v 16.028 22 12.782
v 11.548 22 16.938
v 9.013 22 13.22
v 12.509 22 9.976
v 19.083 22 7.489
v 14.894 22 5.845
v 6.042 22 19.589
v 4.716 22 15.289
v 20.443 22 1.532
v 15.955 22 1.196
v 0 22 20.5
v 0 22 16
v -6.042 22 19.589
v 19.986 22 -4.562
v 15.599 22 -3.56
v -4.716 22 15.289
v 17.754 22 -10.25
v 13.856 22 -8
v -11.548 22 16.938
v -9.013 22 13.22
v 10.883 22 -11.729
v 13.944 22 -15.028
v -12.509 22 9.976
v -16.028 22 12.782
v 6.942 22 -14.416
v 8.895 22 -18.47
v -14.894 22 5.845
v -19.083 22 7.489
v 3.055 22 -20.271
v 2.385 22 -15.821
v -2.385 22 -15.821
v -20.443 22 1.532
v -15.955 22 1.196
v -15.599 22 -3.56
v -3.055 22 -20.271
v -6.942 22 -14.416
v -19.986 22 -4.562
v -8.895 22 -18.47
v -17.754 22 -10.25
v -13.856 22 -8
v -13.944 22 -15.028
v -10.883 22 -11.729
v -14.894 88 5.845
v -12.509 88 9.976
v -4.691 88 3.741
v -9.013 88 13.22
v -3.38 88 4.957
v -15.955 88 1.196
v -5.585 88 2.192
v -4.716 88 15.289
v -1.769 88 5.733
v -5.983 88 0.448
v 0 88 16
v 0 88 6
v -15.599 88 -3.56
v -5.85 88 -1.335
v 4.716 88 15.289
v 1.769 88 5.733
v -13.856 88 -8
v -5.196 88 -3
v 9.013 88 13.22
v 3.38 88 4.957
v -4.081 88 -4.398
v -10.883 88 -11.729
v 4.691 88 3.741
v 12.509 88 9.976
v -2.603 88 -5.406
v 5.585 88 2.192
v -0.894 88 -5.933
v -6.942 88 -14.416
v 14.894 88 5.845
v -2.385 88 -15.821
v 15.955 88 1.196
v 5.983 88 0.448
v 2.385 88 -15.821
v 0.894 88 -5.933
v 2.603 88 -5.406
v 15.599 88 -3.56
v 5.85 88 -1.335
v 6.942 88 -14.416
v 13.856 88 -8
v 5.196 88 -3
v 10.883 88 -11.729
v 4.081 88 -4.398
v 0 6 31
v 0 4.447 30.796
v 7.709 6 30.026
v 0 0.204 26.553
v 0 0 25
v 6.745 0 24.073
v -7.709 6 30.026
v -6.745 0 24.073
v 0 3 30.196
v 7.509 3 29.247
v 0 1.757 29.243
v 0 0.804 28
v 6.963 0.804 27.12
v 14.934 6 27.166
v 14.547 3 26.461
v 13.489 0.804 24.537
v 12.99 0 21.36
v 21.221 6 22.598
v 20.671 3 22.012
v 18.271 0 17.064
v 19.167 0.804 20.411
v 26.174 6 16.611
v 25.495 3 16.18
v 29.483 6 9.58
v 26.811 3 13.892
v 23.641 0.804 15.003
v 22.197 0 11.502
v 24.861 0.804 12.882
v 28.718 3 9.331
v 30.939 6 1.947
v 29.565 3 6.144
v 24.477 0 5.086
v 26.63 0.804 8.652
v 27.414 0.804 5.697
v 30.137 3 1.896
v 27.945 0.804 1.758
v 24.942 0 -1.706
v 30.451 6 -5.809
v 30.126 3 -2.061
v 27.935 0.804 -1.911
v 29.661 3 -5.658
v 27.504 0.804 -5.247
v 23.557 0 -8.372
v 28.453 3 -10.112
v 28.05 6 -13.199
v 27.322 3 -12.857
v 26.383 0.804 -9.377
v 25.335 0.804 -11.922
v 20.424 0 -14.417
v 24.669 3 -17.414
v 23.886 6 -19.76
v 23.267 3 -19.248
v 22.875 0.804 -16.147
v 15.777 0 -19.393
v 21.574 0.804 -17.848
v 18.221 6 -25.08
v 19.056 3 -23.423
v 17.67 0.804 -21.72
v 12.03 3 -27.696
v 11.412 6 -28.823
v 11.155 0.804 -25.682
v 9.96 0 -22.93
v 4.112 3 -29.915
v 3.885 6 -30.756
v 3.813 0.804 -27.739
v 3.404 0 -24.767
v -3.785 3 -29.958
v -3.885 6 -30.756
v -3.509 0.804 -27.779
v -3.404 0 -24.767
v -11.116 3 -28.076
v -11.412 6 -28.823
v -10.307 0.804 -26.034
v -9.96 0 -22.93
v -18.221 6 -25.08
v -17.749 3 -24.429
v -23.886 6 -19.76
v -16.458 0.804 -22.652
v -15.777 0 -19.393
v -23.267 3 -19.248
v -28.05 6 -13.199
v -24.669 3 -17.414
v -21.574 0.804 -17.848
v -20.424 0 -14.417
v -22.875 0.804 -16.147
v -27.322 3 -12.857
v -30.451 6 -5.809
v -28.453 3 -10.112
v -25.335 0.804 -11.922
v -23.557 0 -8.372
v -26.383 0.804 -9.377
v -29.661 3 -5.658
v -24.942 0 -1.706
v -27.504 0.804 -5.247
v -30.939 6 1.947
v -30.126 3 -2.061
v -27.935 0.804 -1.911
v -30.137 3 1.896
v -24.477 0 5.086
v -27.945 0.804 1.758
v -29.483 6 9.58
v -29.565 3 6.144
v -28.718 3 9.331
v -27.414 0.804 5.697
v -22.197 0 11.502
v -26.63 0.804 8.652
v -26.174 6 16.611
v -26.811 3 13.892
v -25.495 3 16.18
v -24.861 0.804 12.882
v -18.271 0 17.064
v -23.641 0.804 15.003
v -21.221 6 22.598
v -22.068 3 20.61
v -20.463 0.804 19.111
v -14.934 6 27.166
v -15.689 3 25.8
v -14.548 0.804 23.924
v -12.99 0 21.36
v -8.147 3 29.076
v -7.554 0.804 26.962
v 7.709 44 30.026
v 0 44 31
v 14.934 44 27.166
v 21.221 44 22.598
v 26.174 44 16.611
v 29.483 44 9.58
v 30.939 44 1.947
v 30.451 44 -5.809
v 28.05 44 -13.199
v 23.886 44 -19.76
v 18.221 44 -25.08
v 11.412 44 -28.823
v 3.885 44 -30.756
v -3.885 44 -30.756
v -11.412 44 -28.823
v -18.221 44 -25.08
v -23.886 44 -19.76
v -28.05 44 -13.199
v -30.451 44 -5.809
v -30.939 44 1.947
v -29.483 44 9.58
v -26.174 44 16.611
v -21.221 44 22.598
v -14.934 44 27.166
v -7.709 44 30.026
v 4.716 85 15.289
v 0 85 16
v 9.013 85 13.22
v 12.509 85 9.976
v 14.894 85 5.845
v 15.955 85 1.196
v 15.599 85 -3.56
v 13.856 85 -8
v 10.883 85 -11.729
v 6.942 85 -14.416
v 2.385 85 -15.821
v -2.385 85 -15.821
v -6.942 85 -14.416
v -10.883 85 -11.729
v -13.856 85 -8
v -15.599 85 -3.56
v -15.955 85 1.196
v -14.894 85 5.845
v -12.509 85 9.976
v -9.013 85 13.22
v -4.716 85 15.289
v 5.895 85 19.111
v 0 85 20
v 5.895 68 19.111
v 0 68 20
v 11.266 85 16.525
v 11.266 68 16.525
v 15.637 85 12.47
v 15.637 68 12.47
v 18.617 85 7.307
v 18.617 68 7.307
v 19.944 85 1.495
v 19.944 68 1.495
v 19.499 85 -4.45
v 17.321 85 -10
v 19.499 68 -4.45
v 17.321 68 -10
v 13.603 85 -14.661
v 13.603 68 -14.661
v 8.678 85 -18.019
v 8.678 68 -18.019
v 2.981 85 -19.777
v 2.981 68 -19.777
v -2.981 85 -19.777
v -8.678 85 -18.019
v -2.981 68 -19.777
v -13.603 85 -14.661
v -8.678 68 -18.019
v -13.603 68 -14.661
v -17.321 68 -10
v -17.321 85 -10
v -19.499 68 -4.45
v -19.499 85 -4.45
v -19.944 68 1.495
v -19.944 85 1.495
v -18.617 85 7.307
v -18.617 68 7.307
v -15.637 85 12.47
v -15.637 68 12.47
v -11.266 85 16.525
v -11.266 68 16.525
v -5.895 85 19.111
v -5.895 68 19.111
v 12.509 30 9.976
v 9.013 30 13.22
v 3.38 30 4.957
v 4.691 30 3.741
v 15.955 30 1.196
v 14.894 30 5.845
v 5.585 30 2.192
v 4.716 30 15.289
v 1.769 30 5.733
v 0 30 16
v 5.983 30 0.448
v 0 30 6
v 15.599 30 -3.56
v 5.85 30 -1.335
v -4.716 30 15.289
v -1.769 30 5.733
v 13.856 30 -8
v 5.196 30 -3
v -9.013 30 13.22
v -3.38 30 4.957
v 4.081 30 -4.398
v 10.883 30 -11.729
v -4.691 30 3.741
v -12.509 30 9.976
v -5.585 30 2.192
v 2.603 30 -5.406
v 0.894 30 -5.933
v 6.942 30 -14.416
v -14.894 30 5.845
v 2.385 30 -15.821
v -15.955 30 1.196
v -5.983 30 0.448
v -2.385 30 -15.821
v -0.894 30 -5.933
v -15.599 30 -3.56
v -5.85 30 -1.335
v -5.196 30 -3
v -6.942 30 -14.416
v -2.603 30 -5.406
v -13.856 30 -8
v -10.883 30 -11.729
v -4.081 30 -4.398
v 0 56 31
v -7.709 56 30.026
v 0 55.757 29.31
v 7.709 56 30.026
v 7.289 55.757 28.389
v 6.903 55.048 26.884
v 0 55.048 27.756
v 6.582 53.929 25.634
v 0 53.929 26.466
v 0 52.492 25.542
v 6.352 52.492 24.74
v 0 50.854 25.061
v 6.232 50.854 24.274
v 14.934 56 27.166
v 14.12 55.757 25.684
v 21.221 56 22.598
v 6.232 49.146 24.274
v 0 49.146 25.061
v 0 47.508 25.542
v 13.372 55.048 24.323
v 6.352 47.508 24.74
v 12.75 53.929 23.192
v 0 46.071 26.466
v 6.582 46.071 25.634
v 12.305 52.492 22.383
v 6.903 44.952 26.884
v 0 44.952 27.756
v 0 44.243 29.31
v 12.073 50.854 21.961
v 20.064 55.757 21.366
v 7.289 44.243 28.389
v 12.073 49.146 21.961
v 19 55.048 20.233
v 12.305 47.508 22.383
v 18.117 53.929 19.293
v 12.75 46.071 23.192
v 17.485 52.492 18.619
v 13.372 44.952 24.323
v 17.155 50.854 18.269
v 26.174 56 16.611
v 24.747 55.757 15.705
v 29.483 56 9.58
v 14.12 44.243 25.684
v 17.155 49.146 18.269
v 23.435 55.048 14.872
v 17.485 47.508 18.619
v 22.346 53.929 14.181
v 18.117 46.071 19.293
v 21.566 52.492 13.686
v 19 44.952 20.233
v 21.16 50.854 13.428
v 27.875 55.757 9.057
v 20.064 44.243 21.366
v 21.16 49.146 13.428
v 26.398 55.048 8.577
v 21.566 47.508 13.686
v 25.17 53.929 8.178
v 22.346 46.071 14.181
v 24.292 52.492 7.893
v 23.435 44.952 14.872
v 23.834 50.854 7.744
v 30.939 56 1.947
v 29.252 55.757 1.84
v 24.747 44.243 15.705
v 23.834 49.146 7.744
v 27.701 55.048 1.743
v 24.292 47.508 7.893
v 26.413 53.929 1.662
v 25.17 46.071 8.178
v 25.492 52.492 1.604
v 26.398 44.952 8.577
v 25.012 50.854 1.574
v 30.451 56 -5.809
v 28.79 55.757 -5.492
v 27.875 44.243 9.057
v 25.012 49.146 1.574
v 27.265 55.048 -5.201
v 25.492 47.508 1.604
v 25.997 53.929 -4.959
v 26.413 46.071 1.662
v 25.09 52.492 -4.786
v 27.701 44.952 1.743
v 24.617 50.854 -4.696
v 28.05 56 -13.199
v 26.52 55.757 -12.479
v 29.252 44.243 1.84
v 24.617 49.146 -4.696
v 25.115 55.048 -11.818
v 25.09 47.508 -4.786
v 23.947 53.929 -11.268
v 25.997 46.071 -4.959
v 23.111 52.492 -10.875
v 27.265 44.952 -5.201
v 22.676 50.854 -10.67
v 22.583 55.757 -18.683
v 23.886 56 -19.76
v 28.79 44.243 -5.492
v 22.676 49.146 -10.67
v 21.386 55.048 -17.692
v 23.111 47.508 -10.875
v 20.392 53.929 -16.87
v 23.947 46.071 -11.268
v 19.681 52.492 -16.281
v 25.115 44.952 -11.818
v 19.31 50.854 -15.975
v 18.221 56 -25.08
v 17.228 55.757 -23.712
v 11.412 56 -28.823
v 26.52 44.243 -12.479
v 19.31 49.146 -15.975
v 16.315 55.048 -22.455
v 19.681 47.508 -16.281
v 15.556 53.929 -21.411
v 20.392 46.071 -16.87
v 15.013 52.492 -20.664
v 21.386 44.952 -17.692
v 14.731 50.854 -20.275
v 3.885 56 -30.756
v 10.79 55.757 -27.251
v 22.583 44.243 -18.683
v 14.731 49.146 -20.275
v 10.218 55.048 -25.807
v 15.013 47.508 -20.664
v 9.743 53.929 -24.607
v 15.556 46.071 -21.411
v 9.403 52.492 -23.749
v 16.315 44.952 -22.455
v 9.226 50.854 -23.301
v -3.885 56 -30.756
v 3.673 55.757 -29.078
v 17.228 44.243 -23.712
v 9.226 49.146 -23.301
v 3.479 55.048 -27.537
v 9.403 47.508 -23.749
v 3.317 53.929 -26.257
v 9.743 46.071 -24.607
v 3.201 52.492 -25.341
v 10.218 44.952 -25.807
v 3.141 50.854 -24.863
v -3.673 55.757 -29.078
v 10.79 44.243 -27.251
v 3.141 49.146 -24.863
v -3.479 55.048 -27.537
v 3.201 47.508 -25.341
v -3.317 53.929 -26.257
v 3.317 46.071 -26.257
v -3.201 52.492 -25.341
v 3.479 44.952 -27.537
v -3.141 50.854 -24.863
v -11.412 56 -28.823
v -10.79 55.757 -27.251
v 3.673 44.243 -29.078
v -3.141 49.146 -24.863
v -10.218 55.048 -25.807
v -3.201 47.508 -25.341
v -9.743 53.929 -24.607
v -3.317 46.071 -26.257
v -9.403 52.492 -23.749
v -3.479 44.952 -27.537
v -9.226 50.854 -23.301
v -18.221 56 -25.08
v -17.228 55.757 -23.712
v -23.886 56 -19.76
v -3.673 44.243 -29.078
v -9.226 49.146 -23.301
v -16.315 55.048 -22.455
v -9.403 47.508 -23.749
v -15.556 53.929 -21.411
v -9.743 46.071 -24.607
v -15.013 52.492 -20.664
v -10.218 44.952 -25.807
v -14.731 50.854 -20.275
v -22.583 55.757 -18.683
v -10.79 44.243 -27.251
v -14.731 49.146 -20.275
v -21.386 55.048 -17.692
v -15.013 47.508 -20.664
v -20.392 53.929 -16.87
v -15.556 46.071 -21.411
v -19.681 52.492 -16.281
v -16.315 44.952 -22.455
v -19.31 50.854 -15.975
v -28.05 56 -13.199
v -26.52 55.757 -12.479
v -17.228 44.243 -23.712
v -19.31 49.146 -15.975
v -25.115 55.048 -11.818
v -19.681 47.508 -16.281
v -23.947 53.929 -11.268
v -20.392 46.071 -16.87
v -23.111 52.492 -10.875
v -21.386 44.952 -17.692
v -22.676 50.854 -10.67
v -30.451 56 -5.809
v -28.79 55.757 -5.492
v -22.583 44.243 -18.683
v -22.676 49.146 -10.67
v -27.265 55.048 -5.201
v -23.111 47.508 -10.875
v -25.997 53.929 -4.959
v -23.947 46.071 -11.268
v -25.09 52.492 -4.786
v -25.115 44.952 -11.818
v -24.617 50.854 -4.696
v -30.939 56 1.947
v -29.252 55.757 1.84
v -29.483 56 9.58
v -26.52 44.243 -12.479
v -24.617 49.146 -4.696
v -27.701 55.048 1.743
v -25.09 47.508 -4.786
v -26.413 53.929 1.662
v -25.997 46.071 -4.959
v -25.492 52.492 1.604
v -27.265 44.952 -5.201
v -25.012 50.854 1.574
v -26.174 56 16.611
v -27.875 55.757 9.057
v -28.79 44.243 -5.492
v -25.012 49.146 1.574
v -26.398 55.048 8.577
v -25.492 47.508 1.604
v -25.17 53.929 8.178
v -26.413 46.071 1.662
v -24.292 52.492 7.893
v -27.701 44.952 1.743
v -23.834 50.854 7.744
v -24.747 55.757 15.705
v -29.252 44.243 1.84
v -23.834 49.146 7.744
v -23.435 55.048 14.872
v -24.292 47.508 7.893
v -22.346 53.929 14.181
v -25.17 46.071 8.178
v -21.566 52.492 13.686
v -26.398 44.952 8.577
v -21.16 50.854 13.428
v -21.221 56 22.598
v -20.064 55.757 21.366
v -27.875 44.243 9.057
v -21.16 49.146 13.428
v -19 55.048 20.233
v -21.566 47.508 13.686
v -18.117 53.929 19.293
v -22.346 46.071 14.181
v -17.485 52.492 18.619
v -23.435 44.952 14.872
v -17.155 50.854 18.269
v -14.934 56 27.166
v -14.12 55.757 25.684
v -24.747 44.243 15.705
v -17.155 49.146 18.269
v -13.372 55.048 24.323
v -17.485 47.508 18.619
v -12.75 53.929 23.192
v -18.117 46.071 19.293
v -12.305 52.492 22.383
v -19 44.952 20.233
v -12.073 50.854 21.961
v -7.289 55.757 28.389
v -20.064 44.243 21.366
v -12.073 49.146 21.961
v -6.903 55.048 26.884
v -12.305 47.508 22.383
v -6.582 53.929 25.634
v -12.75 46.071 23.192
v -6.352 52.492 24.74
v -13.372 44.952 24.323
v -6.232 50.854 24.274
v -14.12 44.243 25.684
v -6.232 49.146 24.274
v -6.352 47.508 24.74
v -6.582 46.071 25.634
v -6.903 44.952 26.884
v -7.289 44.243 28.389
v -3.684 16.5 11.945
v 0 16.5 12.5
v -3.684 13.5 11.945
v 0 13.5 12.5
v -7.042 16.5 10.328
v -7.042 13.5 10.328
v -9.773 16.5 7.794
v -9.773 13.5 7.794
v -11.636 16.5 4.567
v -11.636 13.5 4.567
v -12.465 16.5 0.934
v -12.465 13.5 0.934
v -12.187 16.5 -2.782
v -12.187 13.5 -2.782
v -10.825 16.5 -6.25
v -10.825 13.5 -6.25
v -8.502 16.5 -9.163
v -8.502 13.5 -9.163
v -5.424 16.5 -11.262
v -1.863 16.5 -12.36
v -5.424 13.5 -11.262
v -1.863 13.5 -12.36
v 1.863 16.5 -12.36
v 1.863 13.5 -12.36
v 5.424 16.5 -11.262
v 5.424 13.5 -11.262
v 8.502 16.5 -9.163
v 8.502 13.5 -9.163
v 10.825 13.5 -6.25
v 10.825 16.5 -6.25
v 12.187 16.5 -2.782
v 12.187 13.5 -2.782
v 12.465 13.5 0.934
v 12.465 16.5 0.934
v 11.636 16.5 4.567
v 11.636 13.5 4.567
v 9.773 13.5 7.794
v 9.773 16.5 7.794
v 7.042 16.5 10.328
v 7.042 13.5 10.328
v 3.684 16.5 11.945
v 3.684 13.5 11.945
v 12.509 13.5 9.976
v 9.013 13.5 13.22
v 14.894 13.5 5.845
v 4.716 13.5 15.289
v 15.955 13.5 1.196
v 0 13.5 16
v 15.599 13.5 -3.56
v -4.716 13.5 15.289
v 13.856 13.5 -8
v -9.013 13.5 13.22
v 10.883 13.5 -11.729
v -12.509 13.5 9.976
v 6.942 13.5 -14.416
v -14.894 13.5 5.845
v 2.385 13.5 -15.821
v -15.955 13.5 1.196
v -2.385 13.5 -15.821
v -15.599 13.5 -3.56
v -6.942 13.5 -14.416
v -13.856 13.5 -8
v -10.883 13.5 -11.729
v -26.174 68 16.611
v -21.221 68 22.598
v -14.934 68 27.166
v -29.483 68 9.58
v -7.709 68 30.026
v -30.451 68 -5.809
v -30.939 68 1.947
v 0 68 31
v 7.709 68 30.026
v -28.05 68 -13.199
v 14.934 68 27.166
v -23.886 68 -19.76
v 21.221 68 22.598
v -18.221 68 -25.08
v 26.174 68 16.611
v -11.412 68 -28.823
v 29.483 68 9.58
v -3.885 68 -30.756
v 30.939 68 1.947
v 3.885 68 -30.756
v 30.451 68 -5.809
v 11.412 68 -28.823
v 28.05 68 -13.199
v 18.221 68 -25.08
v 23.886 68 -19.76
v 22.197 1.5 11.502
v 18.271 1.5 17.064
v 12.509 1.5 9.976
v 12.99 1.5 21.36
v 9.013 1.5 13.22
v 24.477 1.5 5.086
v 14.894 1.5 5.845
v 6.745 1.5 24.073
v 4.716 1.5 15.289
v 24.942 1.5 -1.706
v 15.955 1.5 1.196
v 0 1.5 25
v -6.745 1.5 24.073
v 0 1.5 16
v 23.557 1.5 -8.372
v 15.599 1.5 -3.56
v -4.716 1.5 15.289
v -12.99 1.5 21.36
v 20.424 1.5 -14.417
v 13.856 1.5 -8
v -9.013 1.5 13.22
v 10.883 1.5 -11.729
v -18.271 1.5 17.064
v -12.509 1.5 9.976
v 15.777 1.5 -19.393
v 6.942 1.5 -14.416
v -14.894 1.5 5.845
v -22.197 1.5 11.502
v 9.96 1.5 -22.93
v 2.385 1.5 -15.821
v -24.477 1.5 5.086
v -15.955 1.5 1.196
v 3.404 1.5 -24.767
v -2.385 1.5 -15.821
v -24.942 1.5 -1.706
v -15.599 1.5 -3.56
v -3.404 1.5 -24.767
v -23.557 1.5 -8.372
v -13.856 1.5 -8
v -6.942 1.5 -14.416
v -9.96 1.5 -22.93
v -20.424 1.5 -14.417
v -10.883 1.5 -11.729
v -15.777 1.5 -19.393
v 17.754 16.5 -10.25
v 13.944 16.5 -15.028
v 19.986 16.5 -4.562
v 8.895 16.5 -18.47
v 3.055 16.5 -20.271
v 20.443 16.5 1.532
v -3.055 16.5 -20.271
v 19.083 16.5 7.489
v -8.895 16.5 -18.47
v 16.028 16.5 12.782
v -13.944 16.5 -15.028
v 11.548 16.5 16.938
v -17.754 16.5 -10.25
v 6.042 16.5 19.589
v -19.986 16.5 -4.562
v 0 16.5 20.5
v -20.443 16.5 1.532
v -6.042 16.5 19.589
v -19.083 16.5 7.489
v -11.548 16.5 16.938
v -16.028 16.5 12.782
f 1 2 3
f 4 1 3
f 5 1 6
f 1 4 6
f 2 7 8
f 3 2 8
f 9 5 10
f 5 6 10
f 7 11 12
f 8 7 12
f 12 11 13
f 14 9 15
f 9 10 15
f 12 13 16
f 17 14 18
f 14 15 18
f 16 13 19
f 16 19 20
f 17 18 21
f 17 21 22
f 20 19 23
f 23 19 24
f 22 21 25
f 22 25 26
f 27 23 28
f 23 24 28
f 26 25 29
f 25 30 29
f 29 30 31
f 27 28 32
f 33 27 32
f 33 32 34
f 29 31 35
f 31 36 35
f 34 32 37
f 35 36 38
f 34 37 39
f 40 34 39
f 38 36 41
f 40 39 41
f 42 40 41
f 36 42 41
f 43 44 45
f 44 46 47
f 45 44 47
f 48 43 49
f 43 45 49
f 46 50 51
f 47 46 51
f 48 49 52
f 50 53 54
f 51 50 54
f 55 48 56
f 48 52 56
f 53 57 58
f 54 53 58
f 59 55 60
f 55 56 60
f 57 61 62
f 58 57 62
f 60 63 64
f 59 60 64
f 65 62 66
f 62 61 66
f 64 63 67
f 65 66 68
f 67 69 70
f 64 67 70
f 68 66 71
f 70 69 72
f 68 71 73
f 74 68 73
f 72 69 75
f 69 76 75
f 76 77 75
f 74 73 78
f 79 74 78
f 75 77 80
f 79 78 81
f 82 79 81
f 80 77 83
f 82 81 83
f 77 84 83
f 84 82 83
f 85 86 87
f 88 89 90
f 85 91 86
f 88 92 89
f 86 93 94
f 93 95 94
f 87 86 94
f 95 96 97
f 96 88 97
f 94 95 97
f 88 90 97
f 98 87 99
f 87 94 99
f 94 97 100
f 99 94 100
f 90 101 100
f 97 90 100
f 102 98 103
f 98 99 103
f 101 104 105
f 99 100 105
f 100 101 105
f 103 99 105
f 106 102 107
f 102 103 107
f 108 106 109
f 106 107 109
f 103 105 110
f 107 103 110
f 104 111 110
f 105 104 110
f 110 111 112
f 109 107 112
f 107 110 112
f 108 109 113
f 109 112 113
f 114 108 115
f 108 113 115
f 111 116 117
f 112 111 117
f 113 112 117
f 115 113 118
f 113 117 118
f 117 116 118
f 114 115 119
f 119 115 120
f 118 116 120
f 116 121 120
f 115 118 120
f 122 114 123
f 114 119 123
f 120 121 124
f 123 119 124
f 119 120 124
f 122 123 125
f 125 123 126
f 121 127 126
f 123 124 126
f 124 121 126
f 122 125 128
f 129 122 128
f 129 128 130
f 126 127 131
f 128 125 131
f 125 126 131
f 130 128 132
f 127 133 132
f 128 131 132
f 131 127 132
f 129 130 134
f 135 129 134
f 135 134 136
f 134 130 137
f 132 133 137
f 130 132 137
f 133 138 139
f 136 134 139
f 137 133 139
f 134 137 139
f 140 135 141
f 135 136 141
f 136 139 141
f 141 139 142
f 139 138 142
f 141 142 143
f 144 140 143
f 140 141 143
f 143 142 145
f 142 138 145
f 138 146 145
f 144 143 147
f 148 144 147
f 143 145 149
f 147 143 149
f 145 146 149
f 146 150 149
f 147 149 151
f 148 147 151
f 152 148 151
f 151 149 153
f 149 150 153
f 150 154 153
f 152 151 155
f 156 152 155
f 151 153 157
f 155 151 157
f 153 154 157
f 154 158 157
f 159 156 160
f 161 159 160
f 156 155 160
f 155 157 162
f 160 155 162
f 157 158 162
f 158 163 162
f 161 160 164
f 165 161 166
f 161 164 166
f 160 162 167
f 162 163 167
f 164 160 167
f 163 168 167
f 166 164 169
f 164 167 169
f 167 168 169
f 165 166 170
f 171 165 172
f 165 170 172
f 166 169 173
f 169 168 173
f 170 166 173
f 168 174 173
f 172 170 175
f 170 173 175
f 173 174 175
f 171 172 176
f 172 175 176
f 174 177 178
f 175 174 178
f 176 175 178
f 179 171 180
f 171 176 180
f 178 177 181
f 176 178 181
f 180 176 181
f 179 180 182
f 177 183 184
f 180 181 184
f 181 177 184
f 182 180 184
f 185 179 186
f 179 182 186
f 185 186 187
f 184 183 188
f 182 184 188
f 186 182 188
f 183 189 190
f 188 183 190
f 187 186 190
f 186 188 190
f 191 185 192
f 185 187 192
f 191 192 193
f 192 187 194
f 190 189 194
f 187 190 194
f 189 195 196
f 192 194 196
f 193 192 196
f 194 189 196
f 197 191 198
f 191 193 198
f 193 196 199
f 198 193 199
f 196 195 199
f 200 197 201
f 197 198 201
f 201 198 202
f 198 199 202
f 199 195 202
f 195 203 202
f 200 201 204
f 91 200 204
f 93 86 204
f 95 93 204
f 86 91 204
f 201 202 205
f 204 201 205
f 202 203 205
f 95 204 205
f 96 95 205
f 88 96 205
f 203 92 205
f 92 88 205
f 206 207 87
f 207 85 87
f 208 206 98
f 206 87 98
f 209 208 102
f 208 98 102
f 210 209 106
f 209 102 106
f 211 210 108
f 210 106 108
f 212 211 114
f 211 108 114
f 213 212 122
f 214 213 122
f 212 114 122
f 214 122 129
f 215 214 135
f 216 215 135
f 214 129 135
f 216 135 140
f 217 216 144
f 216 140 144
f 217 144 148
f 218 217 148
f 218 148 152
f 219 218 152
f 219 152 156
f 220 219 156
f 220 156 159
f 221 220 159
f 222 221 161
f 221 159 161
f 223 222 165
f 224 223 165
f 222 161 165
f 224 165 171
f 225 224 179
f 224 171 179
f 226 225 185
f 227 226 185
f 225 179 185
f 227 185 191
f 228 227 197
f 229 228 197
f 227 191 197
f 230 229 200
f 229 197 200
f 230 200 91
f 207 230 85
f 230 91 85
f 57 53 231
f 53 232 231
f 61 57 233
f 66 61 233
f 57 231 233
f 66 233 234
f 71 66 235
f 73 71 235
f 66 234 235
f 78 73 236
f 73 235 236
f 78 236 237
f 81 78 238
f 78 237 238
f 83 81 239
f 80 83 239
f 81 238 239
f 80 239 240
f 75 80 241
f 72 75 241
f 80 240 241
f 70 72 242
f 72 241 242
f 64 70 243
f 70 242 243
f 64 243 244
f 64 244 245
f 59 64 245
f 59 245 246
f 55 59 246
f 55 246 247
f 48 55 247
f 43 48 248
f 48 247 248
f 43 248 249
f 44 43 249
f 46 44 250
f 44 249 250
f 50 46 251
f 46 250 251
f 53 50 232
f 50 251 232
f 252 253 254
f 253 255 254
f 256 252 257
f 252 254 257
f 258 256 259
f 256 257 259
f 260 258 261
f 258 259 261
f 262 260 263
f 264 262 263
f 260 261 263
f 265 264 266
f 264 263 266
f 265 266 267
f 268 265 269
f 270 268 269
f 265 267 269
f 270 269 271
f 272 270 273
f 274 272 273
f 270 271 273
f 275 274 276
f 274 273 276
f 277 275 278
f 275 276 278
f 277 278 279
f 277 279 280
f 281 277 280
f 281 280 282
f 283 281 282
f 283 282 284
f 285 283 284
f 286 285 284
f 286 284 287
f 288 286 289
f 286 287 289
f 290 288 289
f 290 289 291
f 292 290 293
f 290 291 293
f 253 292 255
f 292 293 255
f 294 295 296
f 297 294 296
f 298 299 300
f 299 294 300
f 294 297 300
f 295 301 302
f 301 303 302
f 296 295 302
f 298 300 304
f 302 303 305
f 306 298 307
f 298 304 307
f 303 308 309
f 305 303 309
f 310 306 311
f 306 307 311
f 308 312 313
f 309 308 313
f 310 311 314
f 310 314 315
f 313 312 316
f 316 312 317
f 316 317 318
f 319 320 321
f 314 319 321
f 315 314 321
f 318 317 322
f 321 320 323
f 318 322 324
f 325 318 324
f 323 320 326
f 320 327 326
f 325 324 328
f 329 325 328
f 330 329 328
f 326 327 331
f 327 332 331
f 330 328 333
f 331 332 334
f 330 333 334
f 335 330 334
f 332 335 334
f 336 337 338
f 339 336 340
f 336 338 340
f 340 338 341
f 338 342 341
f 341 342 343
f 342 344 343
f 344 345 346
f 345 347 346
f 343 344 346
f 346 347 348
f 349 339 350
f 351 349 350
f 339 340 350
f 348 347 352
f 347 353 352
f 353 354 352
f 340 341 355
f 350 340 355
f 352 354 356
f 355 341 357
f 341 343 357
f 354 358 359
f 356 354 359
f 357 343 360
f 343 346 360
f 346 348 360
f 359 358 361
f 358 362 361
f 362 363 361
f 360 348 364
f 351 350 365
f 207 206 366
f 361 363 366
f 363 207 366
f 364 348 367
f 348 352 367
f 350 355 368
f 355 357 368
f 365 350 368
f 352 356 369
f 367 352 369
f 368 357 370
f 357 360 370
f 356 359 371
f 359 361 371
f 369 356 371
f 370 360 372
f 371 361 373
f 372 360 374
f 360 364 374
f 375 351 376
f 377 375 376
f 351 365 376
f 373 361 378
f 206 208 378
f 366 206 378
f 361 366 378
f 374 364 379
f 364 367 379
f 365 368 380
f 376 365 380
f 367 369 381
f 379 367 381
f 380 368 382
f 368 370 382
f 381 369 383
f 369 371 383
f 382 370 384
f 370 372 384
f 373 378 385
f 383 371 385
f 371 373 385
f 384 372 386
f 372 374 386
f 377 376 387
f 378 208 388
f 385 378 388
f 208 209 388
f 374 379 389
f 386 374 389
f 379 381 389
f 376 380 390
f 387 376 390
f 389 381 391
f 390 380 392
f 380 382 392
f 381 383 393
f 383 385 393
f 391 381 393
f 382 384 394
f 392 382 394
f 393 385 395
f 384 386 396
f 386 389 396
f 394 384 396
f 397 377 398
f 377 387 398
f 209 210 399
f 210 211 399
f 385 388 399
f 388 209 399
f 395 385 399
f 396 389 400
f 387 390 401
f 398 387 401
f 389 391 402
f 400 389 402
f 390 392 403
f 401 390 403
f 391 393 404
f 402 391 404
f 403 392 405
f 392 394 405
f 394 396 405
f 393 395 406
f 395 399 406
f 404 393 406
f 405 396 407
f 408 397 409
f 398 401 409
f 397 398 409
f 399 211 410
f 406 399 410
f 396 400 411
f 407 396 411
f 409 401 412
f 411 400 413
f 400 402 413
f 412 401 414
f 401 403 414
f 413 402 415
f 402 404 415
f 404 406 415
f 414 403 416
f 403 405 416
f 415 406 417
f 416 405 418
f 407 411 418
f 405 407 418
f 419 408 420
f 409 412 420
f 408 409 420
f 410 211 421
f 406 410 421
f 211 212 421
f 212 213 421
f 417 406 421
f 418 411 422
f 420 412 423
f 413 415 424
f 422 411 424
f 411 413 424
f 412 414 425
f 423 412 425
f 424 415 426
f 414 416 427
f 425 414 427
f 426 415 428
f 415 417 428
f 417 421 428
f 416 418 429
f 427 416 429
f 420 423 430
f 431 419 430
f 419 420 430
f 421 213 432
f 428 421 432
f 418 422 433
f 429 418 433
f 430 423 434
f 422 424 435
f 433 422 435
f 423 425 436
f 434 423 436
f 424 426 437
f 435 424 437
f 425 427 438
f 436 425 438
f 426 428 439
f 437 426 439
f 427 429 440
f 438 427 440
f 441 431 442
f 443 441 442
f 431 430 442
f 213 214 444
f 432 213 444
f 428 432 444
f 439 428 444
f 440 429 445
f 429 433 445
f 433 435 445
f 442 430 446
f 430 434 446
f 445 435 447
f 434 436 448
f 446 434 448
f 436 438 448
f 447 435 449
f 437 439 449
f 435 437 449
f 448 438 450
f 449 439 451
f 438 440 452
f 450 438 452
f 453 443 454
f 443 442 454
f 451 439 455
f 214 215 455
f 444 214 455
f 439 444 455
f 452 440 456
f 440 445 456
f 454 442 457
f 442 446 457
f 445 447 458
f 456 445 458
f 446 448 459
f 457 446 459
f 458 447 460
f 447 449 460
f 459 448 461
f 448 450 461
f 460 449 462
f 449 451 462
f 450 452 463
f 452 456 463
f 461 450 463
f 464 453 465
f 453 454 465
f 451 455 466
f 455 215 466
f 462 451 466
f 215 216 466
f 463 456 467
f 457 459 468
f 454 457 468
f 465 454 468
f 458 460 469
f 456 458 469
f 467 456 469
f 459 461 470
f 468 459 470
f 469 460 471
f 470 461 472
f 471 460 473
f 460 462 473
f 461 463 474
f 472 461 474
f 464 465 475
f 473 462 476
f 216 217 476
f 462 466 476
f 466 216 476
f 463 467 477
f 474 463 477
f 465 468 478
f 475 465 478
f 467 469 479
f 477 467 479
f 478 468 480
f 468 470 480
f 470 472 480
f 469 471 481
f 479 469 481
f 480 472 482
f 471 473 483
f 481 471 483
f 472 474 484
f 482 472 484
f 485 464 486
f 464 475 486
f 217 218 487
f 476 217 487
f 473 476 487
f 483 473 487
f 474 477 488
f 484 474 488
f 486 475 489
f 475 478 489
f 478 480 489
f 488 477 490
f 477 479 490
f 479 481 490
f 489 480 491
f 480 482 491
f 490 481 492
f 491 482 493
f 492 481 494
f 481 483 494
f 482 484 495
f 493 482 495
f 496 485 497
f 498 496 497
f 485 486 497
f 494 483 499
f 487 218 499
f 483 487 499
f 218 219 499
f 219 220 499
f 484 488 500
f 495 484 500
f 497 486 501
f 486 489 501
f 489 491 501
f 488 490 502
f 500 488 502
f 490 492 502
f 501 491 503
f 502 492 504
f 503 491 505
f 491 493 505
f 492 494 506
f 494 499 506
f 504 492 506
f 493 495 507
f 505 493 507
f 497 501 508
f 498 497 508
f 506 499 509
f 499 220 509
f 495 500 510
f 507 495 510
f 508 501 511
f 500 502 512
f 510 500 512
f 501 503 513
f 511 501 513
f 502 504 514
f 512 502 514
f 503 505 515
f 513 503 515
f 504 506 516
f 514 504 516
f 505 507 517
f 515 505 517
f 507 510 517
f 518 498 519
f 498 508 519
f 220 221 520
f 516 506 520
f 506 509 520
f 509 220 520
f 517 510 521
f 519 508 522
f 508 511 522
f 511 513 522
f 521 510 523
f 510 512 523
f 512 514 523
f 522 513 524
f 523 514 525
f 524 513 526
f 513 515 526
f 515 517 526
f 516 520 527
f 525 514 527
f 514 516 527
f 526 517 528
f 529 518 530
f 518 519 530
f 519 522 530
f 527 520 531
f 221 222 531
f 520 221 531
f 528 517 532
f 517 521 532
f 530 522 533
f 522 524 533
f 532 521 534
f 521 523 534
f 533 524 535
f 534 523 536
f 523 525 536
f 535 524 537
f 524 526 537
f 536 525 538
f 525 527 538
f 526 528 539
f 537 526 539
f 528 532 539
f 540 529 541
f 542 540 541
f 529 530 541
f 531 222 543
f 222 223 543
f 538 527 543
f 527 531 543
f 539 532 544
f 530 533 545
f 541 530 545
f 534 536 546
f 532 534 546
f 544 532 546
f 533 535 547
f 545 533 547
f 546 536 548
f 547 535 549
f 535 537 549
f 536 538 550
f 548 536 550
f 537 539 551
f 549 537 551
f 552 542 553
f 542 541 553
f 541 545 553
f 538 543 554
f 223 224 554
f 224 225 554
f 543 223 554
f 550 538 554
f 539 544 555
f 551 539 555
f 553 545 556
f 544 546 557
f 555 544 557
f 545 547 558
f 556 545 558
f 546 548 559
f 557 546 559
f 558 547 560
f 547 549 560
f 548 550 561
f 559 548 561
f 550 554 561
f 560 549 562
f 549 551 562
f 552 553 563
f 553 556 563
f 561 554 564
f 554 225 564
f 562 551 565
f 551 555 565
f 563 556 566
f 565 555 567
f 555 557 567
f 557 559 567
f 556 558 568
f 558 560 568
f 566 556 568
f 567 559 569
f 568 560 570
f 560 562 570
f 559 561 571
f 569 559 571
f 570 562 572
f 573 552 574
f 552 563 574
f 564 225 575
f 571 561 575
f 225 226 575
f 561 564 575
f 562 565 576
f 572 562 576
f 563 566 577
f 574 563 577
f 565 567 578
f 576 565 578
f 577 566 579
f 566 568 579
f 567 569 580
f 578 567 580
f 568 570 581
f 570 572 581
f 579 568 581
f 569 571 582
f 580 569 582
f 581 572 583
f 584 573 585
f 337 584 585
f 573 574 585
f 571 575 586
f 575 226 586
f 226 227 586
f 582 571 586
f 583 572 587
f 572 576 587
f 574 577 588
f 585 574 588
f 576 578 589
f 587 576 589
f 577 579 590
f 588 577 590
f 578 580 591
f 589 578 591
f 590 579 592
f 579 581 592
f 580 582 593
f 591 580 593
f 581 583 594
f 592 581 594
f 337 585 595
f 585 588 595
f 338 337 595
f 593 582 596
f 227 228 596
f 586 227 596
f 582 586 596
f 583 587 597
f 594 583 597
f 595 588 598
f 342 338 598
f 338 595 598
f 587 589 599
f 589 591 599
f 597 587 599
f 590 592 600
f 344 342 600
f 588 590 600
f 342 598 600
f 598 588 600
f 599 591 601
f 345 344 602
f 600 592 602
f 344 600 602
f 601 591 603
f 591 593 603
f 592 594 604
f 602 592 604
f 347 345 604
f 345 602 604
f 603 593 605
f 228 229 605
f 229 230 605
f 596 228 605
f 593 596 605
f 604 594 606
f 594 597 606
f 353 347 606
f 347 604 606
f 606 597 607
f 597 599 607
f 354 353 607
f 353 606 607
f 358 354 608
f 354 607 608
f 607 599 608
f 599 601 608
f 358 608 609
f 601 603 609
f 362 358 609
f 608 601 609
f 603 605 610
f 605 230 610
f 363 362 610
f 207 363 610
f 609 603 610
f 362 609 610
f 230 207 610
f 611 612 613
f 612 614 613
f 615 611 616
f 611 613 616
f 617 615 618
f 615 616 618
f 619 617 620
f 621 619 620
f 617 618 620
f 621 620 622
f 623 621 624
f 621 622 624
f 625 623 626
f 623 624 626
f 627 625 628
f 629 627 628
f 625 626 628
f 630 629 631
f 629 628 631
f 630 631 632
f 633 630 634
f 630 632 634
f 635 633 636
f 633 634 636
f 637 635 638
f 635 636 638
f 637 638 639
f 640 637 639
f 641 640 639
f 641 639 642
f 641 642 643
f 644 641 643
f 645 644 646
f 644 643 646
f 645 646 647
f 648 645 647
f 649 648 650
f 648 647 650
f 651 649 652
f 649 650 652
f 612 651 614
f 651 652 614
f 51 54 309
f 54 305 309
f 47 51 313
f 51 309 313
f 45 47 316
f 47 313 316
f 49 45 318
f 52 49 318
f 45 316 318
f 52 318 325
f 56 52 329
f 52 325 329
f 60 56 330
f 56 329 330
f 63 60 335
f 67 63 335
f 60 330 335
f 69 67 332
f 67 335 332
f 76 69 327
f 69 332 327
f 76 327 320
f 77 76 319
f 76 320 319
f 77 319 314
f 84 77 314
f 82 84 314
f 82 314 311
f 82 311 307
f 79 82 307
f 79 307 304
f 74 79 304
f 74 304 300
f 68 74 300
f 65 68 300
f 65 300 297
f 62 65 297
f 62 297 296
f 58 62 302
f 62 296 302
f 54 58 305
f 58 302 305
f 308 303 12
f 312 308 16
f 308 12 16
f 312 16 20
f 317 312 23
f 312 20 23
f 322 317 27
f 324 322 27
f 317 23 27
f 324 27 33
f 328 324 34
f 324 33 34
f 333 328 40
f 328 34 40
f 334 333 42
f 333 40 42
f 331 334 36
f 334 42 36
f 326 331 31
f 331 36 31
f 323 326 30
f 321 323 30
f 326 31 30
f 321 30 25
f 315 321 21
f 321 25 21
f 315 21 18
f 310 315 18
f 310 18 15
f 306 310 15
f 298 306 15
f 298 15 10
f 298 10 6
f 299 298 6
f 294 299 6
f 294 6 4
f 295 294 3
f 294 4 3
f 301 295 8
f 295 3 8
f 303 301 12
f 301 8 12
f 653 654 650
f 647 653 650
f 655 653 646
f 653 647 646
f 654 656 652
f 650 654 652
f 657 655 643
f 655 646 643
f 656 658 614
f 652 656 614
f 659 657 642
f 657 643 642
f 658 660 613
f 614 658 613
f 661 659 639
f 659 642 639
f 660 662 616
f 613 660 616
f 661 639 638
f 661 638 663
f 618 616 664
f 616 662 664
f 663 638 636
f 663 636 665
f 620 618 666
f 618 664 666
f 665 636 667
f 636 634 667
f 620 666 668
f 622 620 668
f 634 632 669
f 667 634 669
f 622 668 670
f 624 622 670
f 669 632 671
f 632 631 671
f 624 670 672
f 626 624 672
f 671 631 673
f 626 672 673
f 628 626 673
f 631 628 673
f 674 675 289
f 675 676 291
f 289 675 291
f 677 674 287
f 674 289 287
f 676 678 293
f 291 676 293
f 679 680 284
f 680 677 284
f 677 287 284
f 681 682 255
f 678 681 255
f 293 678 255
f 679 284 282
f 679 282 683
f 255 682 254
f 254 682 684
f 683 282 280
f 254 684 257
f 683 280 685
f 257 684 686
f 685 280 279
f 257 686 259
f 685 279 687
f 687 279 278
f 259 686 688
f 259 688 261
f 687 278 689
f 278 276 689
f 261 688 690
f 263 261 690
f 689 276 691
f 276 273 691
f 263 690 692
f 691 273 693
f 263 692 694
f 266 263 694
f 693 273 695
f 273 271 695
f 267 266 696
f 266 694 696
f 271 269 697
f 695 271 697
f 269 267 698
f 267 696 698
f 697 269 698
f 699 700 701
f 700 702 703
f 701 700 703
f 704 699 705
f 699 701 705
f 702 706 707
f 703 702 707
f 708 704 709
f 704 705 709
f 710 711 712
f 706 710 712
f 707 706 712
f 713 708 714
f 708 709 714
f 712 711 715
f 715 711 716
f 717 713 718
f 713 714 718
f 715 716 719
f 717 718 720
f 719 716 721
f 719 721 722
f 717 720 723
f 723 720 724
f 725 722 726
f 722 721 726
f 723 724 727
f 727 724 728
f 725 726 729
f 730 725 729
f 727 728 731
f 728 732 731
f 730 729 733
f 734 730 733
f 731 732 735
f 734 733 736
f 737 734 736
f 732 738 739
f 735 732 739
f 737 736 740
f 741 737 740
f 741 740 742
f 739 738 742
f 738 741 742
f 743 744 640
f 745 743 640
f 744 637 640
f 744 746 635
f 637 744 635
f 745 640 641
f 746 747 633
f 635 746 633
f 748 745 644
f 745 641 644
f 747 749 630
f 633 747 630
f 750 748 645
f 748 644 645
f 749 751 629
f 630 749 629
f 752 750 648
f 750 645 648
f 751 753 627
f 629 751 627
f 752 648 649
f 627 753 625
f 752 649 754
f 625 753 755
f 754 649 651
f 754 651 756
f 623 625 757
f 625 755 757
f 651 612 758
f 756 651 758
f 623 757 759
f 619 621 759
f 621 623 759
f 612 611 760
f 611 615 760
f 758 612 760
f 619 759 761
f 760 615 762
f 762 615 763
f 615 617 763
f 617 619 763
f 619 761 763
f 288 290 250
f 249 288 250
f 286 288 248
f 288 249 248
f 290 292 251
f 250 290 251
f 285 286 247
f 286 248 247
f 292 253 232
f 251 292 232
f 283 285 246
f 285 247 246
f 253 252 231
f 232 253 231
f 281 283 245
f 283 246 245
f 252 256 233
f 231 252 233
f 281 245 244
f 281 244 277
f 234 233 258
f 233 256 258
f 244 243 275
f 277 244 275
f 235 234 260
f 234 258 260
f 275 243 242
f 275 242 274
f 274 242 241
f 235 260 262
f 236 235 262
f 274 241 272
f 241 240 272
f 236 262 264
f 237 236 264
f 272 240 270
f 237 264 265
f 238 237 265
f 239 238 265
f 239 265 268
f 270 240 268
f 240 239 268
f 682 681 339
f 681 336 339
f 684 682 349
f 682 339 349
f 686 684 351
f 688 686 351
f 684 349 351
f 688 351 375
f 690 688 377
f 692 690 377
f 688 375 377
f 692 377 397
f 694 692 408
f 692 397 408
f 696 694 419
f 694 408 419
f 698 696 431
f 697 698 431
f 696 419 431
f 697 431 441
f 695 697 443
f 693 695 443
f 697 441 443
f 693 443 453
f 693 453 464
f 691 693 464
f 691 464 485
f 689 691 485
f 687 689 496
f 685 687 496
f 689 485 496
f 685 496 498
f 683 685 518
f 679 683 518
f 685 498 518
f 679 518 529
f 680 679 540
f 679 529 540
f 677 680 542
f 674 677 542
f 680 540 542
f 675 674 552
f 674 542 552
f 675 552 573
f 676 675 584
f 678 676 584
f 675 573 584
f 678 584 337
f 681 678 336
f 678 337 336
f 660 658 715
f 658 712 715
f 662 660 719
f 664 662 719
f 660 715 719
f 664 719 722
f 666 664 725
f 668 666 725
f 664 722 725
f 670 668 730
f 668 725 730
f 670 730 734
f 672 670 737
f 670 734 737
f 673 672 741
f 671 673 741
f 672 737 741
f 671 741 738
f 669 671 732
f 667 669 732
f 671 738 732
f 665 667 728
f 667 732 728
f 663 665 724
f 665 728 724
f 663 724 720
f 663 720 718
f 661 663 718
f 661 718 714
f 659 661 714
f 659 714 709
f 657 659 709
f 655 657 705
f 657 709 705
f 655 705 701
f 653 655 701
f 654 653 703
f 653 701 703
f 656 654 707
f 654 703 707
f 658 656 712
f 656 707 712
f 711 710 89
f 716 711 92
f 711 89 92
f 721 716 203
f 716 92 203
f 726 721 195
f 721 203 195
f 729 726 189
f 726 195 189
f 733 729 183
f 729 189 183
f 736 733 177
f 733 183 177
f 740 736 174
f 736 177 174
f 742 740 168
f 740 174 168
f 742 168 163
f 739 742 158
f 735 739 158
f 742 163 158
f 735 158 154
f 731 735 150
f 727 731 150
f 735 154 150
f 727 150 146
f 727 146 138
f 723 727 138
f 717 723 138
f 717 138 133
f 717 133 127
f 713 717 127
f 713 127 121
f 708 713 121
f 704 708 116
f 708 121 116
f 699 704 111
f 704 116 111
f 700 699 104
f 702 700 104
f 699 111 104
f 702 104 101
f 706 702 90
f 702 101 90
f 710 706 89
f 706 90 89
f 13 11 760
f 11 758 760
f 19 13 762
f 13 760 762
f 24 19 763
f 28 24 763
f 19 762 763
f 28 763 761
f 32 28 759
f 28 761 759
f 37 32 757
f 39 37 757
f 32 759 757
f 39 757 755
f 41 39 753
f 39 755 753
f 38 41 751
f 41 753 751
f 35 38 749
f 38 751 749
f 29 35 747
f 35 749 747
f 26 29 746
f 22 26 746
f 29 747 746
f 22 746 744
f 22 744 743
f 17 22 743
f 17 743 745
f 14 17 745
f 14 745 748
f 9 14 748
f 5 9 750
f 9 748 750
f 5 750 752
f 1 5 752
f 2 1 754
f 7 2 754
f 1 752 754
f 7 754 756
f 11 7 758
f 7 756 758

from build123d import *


with BuildPart() as f1:
    # F0 (on Right) → F1 (revolve)
    with BuildSketch(Plane.YZ):
        with BuildLine():
            Line((0, 25), (0, 0))
            Line((0, 0), (88, 0))
            Line((88, 0), (88, 16))
            Line((88, 16), (85, 16))
            Line((85, 16), (85, 20))
            Line((85, 20), (68, 20))
            Line((68, 20), (68, 31))
            Line((68, 31), (56, 31))
            ThreePointArc((56, 31), (50, 25), (44, 31))
            Line((44, 31), (6, 31))
            ThreePointArc((6, 31), (1.757359, 29.242641), (0, 25))
        make_face()
    revolve(axis=Axis((0, 61.81017, 0), (0, 1, 0)))

    # F2 (on Right) → F3 (revolve, cut)
    with BuildSketch(Plane.YZ):
        Polygon((13.5, 12.5), (13.5, 16), (1.5, 16), (1.5, 0), (88, 0), (88, 6), (30, 6), (30, 16), (22, 16), (22, 20.5), (16.5, 20.5), (16.5, 12.5), align=None)
        Polygon((1.5, 0), (1.5, 16), (1.5, 25), (0, 25), (0, 0), align=None)
    revolve(axis=Axis((0, 44, 0), (0, -1, 0)), mode=Mode.SUBTRACT)


solid = f1.part
